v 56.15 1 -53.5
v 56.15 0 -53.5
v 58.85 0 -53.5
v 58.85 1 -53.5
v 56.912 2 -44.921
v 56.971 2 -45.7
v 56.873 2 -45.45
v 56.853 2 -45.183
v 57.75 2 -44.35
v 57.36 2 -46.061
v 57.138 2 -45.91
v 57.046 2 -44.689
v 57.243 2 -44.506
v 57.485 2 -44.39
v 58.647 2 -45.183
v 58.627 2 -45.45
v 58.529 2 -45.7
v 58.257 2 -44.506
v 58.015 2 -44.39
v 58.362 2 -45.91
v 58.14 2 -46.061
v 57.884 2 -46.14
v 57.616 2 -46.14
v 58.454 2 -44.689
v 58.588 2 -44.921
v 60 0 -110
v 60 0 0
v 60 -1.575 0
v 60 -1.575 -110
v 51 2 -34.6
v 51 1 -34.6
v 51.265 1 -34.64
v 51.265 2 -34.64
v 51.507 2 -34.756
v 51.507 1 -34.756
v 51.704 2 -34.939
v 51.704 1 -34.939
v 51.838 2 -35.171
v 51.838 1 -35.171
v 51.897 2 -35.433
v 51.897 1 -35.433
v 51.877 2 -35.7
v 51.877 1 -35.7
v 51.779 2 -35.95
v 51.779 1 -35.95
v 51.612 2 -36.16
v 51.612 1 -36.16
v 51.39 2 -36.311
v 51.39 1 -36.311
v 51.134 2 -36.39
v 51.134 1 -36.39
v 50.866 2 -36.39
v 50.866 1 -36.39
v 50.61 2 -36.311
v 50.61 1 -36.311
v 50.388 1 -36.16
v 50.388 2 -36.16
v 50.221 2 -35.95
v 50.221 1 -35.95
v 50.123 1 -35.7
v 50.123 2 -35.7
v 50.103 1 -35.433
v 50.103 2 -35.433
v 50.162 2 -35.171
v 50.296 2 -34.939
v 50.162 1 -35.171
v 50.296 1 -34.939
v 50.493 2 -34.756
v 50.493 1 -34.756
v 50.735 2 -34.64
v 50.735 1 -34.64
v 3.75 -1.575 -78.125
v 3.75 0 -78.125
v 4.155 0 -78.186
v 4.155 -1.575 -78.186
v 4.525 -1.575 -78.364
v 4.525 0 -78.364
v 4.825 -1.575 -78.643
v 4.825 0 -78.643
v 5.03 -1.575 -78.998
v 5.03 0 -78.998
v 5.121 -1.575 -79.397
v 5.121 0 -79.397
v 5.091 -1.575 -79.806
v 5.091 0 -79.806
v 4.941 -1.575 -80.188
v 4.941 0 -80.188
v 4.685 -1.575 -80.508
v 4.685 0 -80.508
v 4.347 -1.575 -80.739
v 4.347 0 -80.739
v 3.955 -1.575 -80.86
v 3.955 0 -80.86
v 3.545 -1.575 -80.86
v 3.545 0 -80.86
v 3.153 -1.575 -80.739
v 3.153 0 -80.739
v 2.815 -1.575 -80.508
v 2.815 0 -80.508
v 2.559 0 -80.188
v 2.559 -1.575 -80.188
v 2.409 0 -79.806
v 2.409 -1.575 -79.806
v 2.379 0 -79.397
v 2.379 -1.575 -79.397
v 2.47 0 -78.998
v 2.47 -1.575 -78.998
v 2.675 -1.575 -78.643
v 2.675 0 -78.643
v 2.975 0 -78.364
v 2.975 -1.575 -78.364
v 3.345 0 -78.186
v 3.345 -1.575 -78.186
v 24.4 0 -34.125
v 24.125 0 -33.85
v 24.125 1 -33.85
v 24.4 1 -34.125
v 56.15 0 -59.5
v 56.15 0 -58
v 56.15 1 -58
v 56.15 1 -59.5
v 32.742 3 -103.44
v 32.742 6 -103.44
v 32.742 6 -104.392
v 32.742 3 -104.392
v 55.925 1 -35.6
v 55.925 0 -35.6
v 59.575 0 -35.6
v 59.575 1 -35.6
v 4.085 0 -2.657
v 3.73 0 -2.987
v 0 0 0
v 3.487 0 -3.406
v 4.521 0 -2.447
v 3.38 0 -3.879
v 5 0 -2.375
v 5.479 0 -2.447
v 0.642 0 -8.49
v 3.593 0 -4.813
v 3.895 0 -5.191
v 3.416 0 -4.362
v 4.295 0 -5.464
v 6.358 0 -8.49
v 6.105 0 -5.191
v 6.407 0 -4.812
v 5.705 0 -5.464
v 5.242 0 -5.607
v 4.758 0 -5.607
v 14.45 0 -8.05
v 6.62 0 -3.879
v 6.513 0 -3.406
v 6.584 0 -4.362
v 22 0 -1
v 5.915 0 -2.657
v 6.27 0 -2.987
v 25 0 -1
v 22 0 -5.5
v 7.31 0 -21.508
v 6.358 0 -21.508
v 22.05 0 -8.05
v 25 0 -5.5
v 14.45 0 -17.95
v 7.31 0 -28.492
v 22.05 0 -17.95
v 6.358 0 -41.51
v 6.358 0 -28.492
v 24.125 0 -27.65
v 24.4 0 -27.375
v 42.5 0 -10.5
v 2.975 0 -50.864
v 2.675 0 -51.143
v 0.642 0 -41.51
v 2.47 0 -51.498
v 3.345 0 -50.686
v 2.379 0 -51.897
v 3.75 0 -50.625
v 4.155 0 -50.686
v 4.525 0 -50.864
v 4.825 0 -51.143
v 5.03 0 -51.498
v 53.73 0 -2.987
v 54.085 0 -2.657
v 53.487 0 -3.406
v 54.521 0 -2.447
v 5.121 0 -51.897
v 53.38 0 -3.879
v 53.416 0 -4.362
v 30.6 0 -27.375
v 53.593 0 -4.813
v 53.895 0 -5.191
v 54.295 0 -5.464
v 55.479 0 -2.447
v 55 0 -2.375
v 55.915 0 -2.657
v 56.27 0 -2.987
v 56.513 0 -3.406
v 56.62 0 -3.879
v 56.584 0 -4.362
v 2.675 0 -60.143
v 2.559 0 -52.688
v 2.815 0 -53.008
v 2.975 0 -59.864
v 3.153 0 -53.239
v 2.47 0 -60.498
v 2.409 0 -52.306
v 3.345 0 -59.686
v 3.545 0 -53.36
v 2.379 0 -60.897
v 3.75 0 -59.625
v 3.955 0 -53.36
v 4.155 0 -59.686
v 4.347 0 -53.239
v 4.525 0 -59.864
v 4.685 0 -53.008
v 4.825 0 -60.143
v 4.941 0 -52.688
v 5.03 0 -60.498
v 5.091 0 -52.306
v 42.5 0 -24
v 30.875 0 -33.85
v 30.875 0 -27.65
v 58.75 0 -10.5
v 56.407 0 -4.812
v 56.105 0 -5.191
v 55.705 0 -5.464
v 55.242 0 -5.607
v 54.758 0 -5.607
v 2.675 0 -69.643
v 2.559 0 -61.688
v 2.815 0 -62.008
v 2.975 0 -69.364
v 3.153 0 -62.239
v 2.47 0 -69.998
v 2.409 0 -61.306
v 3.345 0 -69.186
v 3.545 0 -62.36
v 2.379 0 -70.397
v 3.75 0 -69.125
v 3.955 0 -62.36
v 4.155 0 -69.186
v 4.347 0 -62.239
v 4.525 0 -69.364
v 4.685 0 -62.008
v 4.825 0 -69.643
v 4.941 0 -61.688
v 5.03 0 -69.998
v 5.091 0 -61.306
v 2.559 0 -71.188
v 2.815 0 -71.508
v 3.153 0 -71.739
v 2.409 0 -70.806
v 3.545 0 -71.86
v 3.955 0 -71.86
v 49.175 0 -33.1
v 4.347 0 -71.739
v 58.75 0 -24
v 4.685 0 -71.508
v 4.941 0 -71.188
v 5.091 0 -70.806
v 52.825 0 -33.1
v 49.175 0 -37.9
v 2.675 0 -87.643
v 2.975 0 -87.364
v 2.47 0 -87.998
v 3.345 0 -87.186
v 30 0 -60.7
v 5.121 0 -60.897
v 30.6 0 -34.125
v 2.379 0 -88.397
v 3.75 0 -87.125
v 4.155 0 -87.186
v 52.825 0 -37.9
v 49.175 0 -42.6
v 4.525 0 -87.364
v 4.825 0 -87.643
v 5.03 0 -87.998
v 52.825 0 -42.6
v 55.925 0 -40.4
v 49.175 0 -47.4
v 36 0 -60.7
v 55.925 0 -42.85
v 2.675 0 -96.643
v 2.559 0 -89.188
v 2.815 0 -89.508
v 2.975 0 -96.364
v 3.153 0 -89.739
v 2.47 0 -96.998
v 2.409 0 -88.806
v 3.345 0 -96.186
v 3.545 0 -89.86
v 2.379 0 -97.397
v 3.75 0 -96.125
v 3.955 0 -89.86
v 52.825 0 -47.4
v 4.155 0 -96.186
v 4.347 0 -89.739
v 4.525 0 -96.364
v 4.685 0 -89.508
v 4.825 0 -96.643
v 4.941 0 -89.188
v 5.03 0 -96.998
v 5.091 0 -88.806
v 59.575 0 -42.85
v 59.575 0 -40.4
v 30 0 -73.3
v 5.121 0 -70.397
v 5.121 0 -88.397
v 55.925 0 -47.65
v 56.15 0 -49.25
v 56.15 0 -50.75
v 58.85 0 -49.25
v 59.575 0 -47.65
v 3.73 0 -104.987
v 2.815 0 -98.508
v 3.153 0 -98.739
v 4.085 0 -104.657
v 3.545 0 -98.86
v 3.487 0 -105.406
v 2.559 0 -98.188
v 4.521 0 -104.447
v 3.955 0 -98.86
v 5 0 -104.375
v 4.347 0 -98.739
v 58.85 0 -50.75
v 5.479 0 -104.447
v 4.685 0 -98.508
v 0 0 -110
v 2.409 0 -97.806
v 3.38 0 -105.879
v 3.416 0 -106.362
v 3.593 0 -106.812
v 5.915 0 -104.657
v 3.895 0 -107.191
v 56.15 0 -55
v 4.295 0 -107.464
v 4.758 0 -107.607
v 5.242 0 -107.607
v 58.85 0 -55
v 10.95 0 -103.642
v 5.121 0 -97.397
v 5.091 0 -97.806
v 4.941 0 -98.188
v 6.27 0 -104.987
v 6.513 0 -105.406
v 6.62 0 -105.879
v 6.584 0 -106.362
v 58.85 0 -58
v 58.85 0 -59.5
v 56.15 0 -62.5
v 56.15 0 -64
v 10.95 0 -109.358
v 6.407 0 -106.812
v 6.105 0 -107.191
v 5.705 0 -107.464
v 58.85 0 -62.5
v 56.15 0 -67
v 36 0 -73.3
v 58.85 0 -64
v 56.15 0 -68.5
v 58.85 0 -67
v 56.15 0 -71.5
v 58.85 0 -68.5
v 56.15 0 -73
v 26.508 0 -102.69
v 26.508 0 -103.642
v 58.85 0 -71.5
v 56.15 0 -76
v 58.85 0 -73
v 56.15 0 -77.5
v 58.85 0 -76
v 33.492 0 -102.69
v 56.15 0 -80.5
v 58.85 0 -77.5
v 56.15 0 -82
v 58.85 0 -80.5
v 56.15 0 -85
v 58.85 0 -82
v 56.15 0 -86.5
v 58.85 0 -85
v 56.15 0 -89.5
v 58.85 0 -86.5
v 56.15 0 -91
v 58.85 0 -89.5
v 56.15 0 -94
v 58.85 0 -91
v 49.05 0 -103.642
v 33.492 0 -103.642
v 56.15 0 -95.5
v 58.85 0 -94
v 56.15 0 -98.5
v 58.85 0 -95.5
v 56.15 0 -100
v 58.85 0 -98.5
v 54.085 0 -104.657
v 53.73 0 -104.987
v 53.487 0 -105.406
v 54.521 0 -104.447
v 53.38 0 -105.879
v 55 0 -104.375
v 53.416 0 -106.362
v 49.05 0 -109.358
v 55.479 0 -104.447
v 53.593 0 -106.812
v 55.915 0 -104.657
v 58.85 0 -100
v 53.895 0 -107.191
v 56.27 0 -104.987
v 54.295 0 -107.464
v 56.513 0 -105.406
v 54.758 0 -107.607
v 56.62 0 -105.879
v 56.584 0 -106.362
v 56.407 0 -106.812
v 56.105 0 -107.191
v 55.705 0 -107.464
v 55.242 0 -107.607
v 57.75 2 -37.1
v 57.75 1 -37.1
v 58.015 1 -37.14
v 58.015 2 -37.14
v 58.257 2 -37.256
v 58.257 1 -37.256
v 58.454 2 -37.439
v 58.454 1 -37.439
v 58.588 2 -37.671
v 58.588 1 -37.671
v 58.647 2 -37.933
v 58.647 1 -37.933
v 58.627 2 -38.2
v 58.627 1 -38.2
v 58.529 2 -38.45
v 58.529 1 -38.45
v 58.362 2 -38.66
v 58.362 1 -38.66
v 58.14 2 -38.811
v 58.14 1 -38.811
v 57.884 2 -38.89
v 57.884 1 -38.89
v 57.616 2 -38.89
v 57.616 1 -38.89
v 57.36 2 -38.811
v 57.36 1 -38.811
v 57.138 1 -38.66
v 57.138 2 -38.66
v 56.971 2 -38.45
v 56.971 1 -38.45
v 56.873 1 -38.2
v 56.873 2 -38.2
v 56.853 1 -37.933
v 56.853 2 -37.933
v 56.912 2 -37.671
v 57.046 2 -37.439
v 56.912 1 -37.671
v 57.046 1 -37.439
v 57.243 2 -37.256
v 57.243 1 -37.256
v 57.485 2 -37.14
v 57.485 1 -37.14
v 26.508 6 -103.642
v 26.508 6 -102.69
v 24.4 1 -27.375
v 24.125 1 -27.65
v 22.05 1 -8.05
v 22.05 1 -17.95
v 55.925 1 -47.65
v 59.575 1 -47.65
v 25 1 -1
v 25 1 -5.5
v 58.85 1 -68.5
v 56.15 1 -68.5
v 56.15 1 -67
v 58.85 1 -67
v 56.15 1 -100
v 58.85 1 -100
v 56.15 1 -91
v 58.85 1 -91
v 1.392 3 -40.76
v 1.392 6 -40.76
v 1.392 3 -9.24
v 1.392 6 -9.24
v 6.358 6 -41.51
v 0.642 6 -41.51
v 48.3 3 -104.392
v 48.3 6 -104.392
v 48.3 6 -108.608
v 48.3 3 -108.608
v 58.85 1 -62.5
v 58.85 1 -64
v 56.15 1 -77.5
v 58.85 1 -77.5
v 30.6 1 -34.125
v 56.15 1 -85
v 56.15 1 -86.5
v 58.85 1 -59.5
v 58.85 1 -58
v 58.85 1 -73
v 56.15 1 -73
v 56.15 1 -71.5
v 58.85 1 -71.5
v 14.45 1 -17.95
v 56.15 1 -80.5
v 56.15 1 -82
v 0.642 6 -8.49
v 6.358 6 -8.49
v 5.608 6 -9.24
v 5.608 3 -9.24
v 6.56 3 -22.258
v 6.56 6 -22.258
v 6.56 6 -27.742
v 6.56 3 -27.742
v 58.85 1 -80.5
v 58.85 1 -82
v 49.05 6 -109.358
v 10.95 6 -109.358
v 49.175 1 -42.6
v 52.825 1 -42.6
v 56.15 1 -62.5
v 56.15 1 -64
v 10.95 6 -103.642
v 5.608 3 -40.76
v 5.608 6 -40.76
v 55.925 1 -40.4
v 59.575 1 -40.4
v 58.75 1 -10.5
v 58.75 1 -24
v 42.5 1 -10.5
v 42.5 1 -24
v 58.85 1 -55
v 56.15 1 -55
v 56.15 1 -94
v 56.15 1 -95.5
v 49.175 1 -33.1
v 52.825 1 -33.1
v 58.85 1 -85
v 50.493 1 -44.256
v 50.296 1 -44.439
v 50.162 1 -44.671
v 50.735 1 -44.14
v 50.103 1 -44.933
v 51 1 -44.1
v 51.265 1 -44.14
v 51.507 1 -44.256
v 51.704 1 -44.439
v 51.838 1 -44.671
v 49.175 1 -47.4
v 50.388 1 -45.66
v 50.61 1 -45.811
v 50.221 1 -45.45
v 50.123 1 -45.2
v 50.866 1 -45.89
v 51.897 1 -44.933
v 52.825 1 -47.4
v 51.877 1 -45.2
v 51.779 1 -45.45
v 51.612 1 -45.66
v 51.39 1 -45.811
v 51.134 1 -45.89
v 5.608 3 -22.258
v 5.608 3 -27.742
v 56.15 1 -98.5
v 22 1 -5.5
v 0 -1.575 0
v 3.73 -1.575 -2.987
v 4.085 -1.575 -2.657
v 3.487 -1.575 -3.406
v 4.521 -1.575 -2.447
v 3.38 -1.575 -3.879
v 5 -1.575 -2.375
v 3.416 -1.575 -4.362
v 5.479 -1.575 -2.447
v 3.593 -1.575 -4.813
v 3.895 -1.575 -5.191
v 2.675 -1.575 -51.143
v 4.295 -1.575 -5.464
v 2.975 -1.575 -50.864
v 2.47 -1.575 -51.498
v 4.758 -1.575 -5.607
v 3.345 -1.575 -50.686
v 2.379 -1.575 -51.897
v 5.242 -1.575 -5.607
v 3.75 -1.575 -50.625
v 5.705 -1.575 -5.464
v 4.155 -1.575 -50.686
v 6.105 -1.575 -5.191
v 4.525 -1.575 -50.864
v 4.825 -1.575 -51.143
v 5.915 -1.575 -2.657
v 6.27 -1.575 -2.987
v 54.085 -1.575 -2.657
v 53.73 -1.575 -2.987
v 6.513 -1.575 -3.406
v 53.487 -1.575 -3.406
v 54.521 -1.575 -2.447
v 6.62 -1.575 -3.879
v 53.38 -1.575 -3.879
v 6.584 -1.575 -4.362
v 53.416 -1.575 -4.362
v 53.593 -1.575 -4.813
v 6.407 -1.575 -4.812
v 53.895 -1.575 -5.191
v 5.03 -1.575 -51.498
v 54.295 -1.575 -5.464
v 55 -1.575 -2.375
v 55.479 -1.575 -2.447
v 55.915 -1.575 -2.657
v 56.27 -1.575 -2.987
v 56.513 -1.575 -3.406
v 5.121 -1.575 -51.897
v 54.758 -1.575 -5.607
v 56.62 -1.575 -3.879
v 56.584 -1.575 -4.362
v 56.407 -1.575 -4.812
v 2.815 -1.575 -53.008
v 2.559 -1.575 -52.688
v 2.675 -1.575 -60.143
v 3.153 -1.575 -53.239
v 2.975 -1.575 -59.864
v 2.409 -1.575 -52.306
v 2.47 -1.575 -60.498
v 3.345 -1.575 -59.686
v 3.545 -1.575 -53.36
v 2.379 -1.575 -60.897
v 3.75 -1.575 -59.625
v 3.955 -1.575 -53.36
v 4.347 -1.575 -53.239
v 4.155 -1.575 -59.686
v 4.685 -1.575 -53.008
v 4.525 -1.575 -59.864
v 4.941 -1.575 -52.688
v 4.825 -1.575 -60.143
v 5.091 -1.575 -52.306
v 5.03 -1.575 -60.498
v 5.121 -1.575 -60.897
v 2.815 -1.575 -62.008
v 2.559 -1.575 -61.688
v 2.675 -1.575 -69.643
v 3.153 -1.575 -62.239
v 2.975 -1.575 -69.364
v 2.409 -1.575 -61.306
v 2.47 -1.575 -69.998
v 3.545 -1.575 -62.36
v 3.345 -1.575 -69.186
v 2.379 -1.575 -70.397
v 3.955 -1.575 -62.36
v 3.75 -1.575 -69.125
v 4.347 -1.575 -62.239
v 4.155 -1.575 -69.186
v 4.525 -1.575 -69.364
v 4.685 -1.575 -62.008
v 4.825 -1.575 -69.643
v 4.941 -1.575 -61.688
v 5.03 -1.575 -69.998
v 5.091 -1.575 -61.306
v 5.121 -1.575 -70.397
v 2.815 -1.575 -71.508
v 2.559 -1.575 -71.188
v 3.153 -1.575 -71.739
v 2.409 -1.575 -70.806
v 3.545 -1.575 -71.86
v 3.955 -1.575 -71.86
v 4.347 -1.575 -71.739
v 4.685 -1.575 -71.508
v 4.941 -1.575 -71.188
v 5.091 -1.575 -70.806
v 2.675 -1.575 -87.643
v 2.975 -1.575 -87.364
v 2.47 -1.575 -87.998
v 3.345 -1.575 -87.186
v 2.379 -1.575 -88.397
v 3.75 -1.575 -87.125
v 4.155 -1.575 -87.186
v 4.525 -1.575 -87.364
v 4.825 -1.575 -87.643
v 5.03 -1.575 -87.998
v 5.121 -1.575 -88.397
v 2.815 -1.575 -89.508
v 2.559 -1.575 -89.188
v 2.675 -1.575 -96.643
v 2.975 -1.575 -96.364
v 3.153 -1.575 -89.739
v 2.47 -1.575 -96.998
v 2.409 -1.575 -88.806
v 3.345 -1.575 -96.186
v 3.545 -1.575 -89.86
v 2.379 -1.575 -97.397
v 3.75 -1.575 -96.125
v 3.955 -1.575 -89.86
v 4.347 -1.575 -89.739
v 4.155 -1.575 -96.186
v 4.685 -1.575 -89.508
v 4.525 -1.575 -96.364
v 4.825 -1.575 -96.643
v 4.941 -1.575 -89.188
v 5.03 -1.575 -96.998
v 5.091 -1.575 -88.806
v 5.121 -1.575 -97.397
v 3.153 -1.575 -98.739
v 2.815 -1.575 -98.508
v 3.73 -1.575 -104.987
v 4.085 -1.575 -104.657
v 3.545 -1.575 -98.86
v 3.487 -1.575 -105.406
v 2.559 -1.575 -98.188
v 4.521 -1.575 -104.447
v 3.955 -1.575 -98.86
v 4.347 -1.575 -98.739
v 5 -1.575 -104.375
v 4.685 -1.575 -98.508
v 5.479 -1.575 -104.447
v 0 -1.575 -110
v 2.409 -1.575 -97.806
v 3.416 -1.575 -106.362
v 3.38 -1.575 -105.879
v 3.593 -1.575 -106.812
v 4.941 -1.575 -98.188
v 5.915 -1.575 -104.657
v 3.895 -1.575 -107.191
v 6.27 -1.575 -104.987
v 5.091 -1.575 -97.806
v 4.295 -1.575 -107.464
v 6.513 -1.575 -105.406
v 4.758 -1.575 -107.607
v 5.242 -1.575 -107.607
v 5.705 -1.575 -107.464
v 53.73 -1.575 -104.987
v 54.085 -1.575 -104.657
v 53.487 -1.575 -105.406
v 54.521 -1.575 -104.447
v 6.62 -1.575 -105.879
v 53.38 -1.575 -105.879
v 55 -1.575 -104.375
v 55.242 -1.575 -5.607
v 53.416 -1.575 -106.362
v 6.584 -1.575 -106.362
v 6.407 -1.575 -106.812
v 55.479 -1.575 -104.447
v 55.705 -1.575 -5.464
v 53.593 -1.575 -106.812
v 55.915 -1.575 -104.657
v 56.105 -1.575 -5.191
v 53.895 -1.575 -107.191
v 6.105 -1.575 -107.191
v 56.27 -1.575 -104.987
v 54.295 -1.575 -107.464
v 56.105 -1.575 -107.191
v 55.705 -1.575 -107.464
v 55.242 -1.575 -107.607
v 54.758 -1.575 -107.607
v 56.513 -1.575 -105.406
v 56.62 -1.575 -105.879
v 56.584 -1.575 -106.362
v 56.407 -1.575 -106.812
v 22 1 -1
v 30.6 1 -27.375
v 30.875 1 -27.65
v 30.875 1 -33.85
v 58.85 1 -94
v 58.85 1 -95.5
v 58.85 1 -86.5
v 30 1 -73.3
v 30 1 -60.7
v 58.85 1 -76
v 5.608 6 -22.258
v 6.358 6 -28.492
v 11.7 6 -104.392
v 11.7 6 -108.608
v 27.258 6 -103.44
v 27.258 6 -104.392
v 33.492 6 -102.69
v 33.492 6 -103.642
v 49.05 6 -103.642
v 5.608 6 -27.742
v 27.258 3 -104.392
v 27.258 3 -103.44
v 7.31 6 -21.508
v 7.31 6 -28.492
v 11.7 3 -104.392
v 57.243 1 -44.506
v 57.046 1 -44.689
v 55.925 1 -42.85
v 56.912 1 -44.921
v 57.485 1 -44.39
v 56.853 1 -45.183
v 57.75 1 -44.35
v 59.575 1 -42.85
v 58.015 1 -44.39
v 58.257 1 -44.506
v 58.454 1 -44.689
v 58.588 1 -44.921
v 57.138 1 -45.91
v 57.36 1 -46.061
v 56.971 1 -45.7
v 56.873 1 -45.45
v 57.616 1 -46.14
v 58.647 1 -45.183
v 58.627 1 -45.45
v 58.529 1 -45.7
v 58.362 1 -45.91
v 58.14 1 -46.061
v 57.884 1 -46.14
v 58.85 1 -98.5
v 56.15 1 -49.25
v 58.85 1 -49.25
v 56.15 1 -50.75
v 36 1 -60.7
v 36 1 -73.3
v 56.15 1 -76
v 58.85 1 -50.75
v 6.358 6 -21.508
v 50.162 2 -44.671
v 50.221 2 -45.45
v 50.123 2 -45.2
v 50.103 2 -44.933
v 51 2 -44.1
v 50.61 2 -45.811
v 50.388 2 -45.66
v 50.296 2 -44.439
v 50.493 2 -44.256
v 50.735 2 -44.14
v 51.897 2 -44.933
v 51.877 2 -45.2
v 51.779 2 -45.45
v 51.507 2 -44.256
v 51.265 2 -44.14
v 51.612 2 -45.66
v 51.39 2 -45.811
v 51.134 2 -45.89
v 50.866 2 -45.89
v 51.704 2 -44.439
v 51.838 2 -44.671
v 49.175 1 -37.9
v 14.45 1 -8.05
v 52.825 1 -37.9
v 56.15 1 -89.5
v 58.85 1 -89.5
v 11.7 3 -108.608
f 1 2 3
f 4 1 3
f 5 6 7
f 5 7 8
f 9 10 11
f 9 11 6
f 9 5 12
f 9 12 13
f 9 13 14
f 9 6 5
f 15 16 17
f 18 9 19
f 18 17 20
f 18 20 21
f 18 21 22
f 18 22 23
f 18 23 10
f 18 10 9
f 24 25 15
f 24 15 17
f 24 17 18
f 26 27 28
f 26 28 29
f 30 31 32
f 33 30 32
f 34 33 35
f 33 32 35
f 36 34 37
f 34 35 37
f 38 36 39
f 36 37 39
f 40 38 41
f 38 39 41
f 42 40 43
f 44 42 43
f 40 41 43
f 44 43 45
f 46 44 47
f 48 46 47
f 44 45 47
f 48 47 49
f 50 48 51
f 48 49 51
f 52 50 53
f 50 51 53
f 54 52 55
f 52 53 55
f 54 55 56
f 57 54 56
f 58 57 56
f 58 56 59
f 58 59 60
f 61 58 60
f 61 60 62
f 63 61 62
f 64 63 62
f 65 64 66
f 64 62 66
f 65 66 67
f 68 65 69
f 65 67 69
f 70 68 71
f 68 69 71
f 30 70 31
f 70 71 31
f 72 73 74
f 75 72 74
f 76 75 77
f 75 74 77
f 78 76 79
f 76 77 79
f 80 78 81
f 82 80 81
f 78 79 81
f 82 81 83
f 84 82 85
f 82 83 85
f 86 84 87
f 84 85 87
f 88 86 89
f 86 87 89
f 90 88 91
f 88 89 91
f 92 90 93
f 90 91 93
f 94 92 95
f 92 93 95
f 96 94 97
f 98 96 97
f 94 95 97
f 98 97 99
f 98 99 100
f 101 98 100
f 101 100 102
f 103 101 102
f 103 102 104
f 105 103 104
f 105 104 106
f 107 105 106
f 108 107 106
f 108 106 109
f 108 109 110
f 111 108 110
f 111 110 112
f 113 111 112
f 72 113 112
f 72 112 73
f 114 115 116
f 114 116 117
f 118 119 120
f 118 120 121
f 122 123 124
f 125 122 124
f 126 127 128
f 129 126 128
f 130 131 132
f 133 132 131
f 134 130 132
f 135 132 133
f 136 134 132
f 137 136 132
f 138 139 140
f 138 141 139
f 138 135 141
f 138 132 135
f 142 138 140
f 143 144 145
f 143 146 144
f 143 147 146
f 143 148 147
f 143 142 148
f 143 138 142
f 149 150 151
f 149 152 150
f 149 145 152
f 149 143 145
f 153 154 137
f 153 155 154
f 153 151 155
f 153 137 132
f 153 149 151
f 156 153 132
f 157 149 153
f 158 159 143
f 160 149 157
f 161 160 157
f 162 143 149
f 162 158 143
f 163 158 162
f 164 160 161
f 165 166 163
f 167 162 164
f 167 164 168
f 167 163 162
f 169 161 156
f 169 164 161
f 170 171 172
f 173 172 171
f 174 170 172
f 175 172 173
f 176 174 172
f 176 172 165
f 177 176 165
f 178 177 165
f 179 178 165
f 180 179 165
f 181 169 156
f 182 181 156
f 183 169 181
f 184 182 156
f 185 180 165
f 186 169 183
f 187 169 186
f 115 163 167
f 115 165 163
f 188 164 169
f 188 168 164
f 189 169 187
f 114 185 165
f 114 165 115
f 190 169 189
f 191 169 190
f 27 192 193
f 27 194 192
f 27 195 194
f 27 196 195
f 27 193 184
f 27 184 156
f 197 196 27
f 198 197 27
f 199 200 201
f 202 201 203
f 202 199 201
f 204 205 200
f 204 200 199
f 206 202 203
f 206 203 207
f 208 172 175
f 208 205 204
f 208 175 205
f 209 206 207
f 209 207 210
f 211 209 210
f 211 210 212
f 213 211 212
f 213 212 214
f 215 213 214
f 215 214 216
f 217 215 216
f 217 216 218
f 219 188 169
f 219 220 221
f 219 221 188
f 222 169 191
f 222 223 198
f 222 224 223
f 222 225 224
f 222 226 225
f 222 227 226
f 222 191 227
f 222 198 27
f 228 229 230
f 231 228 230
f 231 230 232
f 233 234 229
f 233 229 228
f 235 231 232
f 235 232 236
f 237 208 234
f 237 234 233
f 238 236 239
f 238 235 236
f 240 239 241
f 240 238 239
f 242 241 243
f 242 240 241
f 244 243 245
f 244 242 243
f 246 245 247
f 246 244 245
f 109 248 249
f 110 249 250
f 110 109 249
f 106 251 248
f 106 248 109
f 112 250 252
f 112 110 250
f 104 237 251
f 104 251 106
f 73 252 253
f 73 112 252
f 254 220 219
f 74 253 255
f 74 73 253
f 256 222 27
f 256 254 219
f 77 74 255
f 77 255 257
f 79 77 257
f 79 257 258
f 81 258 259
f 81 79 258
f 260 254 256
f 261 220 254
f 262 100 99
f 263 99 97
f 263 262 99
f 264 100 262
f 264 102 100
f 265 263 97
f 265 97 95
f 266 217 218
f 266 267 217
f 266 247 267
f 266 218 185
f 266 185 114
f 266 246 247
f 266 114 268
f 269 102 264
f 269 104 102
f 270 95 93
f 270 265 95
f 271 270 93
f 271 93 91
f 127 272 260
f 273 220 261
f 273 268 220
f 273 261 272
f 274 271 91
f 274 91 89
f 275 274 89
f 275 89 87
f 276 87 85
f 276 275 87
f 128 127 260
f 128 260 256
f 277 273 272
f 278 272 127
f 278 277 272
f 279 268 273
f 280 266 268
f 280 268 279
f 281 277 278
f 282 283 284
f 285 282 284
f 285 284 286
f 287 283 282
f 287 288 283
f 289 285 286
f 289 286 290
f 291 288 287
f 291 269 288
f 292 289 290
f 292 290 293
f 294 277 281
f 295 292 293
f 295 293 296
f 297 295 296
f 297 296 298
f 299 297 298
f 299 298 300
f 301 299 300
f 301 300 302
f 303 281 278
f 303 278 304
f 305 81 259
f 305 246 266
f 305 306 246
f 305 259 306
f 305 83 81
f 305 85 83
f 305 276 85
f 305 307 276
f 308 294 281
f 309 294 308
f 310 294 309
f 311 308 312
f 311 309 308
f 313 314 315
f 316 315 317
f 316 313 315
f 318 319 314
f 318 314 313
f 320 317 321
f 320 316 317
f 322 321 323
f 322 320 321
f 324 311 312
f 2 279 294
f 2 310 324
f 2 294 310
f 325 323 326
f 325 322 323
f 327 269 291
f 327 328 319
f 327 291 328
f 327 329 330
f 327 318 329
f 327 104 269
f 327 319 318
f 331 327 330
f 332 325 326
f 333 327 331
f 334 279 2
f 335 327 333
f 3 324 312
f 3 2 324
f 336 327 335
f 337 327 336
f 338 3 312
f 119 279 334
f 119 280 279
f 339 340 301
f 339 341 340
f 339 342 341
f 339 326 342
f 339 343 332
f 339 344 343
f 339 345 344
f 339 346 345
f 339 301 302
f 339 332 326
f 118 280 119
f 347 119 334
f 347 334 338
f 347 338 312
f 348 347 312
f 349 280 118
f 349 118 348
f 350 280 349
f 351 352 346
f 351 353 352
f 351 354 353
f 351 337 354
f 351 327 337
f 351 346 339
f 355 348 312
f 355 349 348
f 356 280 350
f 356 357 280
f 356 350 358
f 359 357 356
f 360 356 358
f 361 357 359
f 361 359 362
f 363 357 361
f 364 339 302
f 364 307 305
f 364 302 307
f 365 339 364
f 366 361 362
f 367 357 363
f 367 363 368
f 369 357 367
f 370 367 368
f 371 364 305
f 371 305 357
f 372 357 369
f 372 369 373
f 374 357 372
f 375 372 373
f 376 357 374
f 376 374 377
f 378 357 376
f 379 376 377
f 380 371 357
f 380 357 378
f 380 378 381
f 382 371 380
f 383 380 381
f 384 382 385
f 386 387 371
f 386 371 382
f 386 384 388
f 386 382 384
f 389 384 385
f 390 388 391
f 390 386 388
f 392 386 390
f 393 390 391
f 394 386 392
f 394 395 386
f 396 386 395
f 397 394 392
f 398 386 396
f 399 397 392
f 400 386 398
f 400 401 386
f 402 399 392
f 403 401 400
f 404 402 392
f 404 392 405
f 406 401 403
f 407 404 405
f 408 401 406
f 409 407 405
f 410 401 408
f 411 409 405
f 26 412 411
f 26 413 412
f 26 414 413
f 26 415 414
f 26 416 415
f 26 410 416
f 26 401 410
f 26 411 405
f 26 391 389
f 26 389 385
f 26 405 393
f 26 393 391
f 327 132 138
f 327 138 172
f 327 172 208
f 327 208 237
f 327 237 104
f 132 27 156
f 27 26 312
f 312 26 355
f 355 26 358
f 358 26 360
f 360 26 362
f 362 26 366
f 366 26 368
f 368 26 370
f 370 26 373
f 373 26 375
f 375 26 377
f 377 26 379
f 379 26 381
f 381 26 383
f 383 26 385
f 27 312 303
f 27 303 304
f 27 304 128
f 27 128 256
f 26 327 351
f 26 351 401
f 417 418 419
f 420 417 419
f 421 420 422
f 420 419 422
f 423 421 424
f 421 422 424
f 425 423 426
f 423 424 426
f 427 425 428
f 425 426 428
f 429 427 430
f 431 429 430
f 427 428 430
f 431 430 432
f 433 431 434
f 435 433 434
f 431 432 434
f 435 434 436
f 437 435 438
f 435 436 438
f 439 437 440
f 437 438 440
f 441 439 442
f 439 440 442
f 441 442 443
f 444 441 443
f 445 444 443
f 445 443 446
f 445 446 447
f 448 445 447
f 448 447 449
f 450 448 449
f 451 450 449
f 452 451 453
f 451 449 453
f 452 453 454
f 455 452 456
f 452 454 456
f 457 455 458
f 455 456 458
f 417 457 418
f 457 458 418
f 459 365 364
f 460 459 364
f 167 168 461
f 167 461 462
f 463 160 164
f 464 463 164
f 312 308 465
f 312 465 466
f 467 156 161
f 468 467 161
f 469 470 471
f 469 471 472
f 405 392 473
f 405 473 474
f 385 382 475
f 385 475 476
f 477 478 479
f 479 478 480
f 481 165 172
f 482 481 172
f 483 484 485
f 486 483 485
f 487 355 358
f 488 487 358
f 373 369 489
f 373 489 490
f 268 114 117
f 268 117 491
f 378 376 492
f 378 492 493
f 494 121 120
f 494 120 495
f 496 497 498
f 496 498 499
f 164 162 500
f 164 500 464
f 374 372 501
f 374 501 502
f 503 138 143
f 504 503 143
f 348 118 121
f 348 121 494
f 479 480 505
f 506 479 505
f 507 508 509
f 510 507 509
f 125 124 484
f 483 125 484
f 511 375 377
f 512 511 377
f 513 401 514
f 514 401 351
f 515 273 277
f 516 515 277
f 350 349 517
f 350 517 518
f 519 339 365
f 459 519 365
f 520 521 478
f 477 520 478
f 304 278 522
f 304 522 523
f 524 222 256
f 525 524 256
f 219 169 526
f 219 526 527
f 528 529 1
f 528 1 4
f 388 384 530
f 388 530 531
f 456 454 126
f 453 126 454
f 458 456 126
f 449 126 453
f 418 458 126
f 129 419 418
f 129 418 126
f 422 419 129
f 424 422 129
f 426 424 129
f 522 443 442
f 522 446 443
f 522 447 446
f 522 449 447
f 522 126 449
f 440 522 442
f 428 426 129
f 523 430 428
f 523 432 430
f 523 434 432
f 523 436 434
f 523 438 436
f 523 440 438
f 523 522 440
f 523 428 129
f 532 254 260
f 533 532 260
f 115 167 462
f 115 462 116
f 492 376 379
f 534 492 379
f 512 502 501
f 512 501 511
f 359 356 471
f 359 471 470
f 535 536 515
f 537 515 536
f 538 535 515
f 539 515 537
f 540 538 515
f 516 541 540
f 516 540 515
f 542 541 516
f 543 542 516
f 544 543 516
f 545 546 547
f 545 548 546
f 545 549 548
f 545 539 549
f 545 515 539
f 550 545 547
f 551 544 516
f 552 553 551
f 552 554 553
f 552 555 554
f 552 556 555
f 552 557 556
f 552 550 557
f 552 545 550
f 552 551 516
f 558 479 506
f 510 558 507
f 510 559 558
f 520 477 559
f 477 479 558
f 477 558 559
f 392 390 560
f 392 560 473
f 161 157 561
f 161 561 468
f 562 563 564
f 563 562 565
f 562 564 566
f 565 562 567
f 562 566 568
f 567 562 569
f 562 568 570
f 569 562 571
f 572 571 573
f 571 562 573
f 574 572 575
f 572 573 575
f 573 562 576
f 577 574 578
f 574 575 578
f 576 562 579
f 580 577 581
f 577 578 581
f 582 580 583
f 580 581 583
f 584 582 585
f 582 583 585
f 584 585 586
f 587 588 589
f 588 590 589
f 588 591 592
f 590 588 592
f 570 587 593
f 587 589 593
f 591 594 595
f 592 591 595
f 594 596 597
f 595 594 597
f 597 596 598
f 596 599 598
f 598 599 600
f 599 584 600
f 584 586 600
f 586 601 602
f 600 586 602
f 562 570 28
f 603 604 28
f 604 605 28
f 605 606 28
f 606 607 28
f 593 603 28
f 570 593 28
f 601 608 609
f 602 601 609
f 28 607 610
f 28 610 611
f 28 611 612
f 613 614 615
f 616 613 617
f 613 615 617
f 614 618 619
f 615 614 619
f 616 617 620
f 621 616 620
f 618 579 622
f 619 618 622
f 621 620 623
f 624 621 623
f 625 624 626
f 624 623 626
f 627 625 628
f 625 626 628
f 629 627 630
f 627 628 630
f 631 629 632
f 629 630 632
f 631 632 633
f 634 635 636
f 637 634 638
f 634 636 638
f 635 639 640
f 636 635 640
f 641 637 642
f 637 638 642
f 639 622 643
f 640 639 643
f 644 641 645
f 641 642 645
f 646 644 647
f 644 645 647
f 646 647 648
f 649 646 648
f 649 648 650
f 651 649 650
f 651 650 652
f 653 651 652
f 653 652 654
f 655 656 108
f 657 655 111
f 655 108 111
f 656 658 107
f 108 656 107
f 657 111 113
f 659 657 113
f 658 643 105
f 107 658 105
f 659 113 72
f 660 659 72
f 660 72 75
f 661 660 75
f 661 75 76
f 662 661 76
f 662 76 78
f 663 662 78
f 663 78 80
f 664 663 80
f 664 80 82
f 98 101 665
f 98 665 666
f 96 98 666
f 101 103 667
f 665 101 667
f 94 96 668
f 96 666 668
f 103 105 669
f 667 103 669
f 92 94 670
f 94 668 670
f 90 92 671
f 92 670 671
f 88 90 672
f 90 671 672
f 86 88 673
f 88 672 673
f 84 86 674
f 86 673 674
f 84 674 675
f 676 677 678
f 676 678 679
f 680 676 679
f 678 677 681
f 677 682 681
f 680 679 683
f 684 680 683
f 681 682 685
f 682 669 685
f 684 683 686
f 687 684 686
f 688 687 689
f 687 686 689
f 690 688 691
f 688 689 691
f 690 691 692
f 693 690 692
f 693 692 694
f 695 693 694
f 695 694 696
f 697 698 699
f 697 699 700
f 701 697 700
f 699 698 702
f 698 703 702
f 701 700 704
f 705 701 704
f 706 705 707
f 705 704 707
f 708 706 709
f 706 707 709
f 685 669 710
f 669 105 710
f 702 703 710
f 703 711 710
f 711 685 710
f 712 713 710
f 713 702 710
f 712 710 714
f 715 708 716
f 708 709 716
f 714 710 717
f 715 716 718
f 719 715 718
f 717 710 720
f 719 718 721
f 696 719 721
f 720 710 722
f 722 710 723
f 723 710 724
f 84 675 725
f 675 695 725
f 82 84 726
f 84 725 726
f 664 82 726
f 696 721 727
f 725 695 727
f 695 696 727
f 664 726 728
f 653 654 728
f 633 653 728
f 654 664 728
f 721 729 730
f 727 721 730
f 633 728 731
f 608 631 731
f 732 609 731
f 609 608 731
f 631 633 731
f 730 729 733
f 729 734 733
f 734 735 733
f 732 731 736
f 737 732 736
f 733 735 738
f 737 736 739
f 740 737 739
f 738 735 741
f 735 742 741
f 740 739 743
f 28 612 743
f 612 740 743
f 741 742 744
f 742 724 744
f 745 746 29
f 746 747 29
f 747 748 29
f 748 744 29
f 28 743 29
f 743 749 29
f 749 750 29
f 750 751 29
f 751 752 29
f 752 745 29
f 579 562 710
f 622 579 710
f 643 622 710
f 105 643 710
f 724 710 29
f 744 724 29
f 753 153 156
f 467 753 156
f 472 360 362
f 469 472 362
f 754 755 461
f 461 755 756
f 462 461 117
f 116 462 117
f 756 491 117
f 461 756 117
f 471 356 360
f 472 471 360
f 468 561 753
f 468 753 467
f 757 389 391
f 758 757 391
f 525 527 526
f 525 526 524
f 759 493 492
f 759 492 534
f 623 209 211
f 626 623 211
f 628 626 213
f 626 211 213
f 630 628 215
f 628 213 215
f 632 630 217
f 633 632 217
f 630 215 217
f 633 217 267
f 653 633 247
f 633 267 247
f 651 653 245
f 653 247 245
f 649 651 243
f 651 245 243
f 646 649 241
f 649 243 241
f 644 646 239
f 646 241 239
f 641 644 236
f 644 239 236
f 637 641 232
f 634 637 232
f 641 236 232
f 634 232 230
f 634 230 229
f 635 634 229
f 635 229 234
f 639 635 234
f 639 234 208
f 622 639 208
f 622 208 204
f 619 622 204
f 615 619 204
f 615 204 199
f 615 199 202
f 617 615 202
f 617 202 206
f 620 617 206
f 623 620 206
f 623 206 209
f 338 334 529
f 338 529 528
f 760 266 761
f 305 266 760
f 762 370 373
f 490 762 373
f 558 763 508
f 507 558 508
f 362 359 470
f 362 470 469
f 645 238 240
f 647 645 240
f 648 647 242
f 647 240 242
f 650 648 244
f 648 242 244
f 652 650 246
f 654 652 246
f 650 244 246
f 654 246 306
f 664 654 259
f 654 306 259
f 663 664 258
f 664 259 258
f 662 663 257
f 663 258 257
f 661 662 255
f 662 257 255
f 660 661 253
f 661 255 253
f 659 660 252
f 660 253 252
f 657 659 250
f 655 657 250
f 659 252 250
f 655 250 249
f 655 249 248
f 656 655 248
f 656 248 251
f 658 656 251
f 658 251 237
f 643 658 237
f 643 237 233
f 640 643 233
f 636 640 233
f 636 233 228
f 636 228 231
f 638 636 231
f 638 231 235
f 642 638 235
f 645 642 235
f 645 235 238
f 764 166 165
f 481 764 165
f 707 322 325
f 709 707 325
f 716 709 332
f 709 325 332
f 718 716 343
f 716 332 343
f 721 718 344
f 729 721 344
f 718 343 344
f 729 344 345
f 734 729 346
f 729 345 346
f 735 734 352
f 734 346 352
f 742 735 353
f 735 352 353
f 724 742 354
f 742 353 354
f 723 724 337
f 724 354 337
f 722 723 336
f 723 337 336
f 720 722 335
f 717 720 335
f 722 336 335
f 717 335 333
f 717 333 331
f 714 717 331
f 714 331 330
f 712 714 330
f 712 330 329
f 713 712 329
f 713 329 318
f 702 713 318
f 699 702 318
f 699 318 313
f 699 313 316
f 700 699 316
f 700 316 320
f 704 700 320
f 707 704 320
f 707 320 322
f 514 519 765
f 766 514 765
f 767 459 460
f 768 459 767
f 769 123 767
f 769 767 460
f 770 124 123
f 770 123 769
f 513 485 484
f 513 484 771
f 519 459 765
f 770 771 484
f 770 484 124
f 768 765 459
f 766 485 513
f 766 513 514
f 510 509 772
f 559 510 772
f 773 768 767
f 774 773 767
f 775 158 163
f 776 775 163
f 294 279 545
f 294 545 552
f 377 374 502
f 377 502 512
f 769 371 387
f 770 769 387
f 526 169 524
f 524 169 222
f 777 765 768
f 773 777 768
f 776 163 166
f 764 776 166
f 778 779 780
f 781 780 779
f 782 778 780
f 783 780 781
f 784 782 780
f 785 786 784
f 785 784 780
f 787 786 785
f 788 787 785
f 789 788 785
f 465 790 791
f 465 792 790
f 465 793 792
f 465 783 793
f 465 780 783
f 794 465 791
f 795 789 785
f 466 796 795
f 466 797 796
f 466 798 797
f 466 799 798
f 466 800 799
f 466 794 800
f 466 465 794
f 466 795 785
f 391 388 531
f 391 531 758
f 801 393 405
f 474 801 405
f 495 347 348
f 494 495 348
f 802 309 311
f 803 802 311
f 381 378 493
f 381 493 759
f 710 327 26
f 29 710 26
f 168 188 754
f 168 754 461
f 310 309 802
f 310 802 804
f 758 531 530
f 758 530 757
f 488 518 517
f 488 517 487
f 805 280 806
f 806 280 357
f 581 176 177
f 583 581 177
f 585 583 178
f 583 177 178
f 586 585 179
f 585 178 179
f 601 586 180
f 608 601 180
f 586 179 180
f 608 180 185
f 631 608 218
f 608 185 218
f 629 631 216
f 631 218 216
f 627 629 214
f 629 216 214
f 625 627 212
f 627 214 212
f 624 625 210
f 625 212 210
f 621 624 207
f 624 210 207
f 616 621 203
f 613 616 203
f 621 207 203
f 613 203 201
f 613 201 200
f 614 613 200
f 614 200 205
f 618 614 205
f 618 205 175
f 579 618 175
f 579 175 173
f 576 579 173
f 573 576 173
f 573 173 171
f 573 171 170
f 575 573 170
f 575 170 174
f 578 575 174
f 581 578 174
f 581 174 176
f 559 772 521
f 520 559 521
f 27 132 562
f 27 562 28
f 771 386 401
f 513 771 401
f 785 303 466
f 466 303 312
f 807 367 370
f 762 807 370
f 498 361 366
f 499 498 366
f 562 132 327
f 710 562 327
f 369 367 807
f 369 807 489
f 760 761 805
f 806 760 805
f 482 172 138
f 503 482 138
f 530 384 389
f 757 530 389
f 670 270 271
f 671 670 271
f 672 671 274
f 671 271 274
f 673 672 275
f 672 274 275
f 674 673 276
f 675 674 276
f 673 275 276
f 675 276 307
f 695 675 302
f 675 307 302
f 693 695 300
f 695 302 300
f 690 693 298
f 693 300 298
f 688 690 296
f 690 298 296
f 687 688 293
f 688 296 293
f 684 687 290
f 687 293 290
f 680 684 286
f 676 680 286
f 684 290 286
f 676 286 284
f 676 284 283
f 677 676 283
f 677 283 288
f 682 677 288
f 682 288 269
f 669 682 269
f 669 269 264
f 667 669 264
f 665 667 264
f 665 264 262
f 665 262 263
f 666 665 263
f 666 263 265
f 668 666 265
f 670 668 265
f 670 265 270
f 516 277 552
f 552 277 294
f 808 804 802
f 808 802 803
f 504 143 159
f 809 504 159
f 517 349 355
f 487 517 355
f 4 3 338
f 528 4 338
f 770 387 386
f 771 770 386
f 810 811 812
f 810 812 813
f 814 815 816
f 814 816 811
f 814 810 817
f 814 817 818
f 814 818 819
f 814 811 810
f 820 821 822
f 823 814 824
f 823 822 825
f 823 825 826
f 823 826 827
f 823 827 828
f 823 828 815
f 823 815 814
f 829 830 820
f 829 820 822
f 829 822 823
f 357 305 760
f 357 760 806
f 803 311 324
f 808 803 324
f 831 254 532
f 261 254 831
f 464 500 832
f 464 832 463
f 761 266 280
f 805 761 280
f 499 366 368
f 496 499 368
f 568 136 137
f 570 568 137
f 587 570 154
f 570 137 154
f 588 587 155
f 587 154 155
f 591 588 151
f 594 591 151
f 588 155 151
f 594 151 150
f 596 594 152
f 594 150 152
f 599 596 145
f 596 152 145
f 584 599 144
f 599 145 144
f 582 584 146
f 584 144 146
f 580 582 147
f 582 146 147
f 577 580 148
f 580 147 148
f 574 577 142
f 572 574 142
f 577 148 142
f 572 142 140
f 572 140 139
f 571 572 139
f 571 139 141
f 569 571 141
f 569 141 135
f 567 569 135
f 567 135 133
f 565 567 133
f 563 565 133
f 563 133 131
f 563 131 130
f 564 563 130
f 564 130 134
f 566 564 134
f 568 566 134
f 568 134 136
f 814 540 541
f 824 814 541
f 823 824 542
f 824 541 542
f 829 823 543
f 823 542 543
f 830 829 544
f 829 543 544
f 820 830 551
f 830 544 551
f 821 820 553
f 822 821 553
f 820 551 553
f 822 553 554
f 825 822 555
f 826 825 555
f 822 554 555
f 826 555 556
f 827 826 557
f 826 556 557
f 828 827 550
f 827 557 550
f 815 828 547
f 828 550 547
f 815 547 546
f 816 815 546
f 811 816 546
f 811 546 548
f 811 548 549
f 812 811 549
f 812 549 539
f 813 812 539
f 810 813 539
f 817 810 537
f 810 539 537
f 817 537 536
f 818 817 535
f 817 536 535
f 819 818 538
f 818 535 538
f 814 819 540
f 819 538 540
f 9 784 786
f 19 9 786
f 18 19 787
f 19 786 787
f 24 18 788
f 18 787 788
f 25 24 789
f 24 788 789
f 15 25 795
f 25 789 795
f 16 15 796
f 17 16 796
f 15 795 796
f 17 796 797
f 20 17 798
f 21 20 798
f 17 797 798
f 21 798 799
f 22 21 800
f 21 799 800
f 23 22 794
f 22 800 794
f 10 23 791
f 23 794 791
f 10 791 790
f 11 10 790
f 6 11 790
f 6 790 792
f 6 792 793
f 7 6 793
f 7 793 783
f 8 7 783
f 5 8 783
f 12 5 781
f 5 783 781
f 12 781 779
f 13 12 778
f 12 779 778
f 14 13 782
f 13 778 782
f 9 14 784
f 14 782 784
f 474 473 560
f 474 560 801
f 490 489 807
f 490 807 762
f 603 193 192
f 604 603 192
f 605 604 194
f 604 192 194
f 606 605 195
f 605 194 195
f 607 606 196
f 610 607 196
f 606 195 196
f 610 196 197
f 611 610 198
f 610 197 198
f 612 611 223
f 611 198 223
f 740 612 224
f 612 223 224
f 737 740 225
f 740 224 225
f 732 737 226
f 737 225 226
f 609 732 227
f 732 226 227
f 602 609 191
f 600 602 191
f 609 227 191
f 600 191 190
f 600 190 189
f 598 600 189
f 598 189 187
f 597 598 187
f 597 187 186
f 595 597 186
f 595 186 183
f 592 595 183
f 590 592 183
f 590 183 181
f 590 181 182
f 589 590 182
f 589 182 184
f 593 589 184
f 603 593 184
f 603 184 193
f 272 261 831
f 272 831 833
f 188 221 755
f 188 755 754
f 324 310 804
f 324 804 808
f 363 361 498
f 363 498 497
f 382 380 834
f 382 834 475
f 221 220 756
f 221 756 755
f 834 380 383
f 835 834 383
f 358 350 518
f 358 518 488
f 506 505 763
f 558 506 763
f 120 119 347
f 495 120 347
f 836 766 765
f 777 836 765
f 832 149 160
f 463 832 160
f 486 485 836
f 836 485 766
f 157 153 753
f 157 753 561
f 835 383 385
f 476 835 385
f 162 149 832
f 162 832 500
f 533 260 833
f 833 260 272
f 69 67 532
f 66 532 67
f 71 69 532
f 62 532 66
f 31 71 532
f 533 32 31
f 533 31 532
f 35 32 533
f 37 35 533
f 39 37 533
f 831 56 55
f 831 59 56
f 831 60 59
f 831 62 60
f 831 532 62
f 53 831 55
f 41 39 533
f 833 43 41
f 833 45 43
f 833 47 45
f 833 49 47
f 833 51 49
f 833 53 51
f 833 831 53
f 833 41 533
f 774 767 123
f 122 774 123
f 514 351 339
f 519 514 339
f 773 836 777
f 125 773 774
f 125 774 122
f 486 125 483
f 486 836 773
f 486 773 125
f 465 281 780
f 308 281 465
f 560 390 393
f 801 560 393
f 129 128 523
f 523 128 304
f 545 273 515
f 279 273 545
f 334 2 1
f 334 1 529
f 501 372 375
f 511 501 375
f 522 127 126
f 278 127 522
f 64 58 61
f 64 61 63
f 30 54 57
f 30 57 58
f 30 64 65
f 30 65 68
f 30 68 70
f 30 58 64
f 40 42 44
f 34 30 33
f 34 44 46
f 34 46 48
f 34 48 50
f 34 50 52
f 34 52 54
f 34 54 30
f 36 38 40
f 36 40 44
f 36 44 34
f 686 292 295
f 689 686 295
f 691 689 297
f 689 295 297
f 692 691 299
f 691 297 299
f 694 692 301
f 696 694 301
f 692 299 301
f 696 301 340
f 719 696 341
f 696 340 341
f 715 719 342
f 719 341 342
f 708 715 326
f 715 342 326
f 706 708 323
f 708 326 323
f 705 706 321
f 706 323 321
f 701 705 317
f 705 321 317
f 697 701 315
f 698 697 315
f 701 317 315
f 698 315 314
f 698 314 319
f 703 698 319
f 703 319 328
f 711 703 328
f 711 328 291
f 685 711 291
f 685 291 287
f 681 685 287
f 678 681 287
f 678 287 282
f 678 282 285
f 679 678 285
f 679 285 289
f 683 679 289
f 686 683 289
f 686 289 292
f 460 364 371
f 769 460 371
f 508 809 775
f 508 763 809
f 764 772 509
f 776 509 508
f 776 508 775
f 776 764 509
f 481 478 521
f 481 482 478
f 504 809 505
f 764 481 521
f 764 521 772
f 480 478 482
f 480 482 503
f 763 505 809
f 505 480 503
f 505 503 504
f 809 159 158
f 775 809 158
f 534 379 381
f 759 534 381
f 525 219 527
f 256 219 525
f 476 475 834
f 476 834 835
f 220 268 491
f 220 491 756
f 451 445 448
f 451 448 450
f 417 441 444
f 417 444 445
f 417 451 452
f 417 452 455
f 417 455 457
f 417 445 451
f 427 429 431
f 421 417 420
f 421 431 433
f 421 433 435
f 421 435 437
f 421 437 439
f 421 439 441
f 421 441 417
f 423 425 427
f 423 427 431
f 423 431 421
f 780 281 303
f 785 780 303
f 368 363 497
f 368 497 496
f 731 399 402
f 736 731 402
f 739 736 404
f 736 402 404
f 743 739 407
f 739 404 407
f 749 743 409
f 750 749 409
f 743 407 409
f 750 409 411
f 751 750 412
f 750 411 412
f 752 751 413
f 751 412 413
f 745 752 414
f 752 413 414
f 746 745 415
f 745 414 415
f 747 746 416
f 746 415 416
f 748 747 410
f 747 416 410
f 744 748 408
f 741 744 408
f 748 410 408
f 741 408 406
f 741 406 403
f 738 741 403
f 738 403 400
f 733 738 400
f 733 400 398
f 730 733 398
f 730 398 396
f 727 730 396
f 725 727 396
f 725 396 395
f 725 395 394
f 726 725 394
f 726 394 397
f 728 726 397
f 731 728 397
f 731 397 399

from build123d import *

# Parameters (mm, degrees)
SKETCH2_W           = 60
SKETCH2_H           = 110
BOSS_EXTRUDE1_DEPTH = 1.5748
BOSS_EXTRUDE2_DEPTH = 6
BOSS_EXTRUDE3_DEPTH = 6
SKETCH6_W           = 6
SKETCH6_H           = 12.6
SKETCH6_W_2         = 7.6
SKETCH6_H_2         = 9.9
SKETCH6_W_3         = 3
SKETCH6_H_3         = 4.5
SKETCH6_W_4         = 16.25
SKETCH6_H_4         = 13.5
SKETCH6_W_5         = 3.65
SKETCH6_H_5         = 4.8
BOSS_EXTRUDE4_DEPTH = 1
SKETCH7_R           = 1.375
SKETCH7_R_2         = 1.625
CUT_EXTRUDE1_DEPTH  = 126.443214245
SKETCH8_R           = 0.9
BOSS_EXTRUDE5_DEPTH = 1
SKETCH9_W           = 2.7
SKETCH9_H           = 1.5
BOSS_EXTRUDE6_DEPTH = 1
CUT_EXTRUDE2_DEPTH  = 3


with BuildPart() as part:
    # Sketch2 → Boss-Extrude1 (new body)
    with BuildSketch(Plane(origin=(0, 0, 0), x_dir=(1, 0, 0), z_dir=(0, 1, 0))):
        with Locations((30, 55)):
            Rectangle(SKETCH2_W, SKETCH2_H)
    extrude(amount=-BOSS_EXTRUDE1_DEPTH)

    # Sketch3 → Boss-Extrude2 (add)
    with BuildSketch(Plane(origin=(0, 0, 0), x_dir=(1, 0, 0), z_dir=(0, 1, 0))):
        Polygon((0.6425, 8.49), (6.3575, 8.49), (6.3575, 21.5075), (7.31, 21.5075), (7.31, 28.4925), (6.3575, 28.4925), (6.3575, 41.51), (0.6425, 41.51), align=None)
    extrude(amount=BOSS_EXTRUDE2_DEPTH)

    # Sketch5 → Boss-Extrude3 (add)
    with BuildSketch(Plane(origin=(0, 0, 0), x_dir=(1, 0, 0), z_dir=(0, 1, 0))):
        Polygon((49.05, 109.3575), (10.95, 109.3575), (10.95, 103.6425), (26.5075, 103.6425), (26.5075, 102.69), (33.4925, 102.69), (33.4925, 103.6425), (49.05, 103.6425), align=None)
    extrude(amount=BOSS_EXTRUDE3_DEPTH)

    # Sketch6 → Boss-Extrude4 (add)
    with BuildSketch(Plane(origin=(0, 0, 0), x_dir=(1, 0, 0), z_dir=(0, 1, 0))):
        with Locations((33, 67)):
            Rectangle(SKETCH6_W, SKETCH6_H)
        Polygon((30.875, 33.85), (30.875, 27.65), (30.6, 27.375), (24.4, 27.375), (24.125, 27.65), (24.125, 33.85), (24.4, 34.125), (30.6, 34.125), align=None)
        with Locations((18.25, 13)):
            Rectangle(SKETCH6_W_2, SKETCH6_H_2)
        with Locations((23.5, 3.25)):
            Rectangle(SKETCH6_W_3, SKETCH6_H_3)
        with Locations((50.625, 17.25)):
            Rectangle(SKETCH6_W_4, SKETCH6_H_4)
        with Locations((57.75, 38)):
            Rectangle(SKETCH6_W_5, SKETCH6_H_5)
        with Locations((57.75, 45.25)):
            Rectangle(SKETCH6_W_5, SKETCH6_H_5)
        with Locations((51, 45)):
            Rectangle(SKETCH6_W_5, SKETCH6_H_5)
        with Locations((51, 35.5)):
            Rectangle(SKETCH6_W_5, SKETCH6_H_5)
    extrude(amount=BOSS_EXTRUDE4_DEPTH)

    # Sketch7 → Cut-Extrude1 (cut, through all)
    with BuildSketch(Plane(origin=(0, 0, 0), x_dir=(1, 0, 0), z_dir=(0, 1, 0))):
        with Locations(Location((3.75, 52, 0), (0, 0, 270))):
            Circle(SKETCH7_R)
        with Locations(Location((3.75, 70.5, 0), (0, 0, 270))):
            Circle(SKETCH7_R)
        with Locations(Location((3.75, 79.5, 0), (0, 0, 270))):
            Circle(SKETCH7_R)
        with Locations(Location((3.75, 88.5, 0), (0, 0, 270))):
            Circle(SKETCH7_R)
        with Locations(Location((3.75, 97.5, 0), (0, 0, 270))):
            Circle(SKETCH7_R)
        with Locations(Location((3.75, 61, 0), (0, 0, 270))):
            Circle(SKETCH7_R)
        with Locations(Location((5, 106, 0), (0, 0, 270))):
            Circle(SKETCH7_R_2)
        with Locations(Location((55, 106, 0), (0, 0, 270))):
            Circle(SKETCH7_R_2)
        with Locations(Location((55, 4, 0), (0, 0, 270))):
            Circle(SKETCH7_R_2)
        with Locations(Location((5, 4, 0), (0, 0, 270))):
            Circle(SKETCH7_R_2)
    extrude(amount=-CUT_EXTRUDE1_DEPTH, mode=Mode.SUBTRACT)

    # Sketch8 → Boss-Extrude5 (add)
    with BuildSketch(Plane(origin=(0, 1, 0), x_dir=(1, 0, 0), z_dir=(0, 1, 0))):
        with Locations(Location((57.75, 38, 0), (0, 0, 270))):
            Circle(SKETCH8_R)
        with Locations(Location((57.75, 45.25, 0), (0, 0, 270))):
            Circle(SKETCH8_R)
        with Locations(Location((51, 45, 0), (0, 0, 270))):
            Circle(SKETCH8_R)
        with Locations(Location((51, 35.5, 0), (0, 0, 270))):
            Circle(SKETCH8_R)
    extrude(amount=BOSS_EXTRUDE5_DEPTH)

    # Sketch9 → Boss-Extrude6 (add)
    with BuildSketch(Plane(origin=(0, 0, 0), x_dir=(1, 0, 0), z_dir=(0, 1, 0))):
        with Locations((57.5, 50)):
            Rectangle(SKETCH9_W, SKETCH9_H)
        with Locations((57.5, 54.25)):
            Rectangle(SKETCH9_W, SKETCH9_H)
        with Locations((57.5, 58.75)):
            Rectangle(SKETCH9_W, SKETCH9_H)
        with Locations((57.5, 63.25)):
            Rectangle(SKETCH9_W, SKETCH9_H)
        with Locations((57.5, 67.75)):
            Rectangle(SKETCH9_W, SKETCH9_H)
        with Locations((57.5, 72.25)):
            Rectangle(SKETCH9_W, SKETCH9_H)
        with Locations((57.5, 76.75)):
            Rectangle(SKETCH9_W, SKETCH9_H)
        with Locations((57.5, 81.25)):
            Rectangle(SKETCH9_W, SKETCH9_H)
        with Locations((57.5, 85.75)):
            Rectangle(SKETCH9_W, SKETCH9_H)
        with Locations((57.5, 90.25)):
            Rectangle(SKETCH9_W, SKETCH9_H)
        with Locations((57.5, 94.75)):
            Rectangle(SKETCH9_W, SKETCH9_H)
        with Locations((57.5, 99.25)):
            Rectangle(SKETCH9_W, SKETCH9_H)
    extrude(amount=BOSS_EXTRUDE6_DEPTH)

    # Sketch10 → Cut-Extrude2 (cut)
    with BuildSketch(Plane(origin=(0, 6, 0), x_dir=(1, 0, 0), z_dir=(0, 1, 0))):
        Polygon((1.3925, 40.76), (1.3925, 9.24), (5.6075, 9.24), (5.6075, 22.2575), (6.56, 22.2575), (6.56, 27.7425), (5.6075, 27.7425), (5.6075, 40.76), align=None)
        Polygon((32.7425, 104.3925), (48.3, 104.3925), (48.3, 108.6075), (11.7, 108.6075), (11.7, 104.3925), (27.2575, 104.3925), (27.2575, 103.44), (32.7425, 103.44), align=None)
    extrude(amount=-CUT_EXTRUDE2_DEPTH, mode=Mode.SUBTRACT)


solid = part.part
